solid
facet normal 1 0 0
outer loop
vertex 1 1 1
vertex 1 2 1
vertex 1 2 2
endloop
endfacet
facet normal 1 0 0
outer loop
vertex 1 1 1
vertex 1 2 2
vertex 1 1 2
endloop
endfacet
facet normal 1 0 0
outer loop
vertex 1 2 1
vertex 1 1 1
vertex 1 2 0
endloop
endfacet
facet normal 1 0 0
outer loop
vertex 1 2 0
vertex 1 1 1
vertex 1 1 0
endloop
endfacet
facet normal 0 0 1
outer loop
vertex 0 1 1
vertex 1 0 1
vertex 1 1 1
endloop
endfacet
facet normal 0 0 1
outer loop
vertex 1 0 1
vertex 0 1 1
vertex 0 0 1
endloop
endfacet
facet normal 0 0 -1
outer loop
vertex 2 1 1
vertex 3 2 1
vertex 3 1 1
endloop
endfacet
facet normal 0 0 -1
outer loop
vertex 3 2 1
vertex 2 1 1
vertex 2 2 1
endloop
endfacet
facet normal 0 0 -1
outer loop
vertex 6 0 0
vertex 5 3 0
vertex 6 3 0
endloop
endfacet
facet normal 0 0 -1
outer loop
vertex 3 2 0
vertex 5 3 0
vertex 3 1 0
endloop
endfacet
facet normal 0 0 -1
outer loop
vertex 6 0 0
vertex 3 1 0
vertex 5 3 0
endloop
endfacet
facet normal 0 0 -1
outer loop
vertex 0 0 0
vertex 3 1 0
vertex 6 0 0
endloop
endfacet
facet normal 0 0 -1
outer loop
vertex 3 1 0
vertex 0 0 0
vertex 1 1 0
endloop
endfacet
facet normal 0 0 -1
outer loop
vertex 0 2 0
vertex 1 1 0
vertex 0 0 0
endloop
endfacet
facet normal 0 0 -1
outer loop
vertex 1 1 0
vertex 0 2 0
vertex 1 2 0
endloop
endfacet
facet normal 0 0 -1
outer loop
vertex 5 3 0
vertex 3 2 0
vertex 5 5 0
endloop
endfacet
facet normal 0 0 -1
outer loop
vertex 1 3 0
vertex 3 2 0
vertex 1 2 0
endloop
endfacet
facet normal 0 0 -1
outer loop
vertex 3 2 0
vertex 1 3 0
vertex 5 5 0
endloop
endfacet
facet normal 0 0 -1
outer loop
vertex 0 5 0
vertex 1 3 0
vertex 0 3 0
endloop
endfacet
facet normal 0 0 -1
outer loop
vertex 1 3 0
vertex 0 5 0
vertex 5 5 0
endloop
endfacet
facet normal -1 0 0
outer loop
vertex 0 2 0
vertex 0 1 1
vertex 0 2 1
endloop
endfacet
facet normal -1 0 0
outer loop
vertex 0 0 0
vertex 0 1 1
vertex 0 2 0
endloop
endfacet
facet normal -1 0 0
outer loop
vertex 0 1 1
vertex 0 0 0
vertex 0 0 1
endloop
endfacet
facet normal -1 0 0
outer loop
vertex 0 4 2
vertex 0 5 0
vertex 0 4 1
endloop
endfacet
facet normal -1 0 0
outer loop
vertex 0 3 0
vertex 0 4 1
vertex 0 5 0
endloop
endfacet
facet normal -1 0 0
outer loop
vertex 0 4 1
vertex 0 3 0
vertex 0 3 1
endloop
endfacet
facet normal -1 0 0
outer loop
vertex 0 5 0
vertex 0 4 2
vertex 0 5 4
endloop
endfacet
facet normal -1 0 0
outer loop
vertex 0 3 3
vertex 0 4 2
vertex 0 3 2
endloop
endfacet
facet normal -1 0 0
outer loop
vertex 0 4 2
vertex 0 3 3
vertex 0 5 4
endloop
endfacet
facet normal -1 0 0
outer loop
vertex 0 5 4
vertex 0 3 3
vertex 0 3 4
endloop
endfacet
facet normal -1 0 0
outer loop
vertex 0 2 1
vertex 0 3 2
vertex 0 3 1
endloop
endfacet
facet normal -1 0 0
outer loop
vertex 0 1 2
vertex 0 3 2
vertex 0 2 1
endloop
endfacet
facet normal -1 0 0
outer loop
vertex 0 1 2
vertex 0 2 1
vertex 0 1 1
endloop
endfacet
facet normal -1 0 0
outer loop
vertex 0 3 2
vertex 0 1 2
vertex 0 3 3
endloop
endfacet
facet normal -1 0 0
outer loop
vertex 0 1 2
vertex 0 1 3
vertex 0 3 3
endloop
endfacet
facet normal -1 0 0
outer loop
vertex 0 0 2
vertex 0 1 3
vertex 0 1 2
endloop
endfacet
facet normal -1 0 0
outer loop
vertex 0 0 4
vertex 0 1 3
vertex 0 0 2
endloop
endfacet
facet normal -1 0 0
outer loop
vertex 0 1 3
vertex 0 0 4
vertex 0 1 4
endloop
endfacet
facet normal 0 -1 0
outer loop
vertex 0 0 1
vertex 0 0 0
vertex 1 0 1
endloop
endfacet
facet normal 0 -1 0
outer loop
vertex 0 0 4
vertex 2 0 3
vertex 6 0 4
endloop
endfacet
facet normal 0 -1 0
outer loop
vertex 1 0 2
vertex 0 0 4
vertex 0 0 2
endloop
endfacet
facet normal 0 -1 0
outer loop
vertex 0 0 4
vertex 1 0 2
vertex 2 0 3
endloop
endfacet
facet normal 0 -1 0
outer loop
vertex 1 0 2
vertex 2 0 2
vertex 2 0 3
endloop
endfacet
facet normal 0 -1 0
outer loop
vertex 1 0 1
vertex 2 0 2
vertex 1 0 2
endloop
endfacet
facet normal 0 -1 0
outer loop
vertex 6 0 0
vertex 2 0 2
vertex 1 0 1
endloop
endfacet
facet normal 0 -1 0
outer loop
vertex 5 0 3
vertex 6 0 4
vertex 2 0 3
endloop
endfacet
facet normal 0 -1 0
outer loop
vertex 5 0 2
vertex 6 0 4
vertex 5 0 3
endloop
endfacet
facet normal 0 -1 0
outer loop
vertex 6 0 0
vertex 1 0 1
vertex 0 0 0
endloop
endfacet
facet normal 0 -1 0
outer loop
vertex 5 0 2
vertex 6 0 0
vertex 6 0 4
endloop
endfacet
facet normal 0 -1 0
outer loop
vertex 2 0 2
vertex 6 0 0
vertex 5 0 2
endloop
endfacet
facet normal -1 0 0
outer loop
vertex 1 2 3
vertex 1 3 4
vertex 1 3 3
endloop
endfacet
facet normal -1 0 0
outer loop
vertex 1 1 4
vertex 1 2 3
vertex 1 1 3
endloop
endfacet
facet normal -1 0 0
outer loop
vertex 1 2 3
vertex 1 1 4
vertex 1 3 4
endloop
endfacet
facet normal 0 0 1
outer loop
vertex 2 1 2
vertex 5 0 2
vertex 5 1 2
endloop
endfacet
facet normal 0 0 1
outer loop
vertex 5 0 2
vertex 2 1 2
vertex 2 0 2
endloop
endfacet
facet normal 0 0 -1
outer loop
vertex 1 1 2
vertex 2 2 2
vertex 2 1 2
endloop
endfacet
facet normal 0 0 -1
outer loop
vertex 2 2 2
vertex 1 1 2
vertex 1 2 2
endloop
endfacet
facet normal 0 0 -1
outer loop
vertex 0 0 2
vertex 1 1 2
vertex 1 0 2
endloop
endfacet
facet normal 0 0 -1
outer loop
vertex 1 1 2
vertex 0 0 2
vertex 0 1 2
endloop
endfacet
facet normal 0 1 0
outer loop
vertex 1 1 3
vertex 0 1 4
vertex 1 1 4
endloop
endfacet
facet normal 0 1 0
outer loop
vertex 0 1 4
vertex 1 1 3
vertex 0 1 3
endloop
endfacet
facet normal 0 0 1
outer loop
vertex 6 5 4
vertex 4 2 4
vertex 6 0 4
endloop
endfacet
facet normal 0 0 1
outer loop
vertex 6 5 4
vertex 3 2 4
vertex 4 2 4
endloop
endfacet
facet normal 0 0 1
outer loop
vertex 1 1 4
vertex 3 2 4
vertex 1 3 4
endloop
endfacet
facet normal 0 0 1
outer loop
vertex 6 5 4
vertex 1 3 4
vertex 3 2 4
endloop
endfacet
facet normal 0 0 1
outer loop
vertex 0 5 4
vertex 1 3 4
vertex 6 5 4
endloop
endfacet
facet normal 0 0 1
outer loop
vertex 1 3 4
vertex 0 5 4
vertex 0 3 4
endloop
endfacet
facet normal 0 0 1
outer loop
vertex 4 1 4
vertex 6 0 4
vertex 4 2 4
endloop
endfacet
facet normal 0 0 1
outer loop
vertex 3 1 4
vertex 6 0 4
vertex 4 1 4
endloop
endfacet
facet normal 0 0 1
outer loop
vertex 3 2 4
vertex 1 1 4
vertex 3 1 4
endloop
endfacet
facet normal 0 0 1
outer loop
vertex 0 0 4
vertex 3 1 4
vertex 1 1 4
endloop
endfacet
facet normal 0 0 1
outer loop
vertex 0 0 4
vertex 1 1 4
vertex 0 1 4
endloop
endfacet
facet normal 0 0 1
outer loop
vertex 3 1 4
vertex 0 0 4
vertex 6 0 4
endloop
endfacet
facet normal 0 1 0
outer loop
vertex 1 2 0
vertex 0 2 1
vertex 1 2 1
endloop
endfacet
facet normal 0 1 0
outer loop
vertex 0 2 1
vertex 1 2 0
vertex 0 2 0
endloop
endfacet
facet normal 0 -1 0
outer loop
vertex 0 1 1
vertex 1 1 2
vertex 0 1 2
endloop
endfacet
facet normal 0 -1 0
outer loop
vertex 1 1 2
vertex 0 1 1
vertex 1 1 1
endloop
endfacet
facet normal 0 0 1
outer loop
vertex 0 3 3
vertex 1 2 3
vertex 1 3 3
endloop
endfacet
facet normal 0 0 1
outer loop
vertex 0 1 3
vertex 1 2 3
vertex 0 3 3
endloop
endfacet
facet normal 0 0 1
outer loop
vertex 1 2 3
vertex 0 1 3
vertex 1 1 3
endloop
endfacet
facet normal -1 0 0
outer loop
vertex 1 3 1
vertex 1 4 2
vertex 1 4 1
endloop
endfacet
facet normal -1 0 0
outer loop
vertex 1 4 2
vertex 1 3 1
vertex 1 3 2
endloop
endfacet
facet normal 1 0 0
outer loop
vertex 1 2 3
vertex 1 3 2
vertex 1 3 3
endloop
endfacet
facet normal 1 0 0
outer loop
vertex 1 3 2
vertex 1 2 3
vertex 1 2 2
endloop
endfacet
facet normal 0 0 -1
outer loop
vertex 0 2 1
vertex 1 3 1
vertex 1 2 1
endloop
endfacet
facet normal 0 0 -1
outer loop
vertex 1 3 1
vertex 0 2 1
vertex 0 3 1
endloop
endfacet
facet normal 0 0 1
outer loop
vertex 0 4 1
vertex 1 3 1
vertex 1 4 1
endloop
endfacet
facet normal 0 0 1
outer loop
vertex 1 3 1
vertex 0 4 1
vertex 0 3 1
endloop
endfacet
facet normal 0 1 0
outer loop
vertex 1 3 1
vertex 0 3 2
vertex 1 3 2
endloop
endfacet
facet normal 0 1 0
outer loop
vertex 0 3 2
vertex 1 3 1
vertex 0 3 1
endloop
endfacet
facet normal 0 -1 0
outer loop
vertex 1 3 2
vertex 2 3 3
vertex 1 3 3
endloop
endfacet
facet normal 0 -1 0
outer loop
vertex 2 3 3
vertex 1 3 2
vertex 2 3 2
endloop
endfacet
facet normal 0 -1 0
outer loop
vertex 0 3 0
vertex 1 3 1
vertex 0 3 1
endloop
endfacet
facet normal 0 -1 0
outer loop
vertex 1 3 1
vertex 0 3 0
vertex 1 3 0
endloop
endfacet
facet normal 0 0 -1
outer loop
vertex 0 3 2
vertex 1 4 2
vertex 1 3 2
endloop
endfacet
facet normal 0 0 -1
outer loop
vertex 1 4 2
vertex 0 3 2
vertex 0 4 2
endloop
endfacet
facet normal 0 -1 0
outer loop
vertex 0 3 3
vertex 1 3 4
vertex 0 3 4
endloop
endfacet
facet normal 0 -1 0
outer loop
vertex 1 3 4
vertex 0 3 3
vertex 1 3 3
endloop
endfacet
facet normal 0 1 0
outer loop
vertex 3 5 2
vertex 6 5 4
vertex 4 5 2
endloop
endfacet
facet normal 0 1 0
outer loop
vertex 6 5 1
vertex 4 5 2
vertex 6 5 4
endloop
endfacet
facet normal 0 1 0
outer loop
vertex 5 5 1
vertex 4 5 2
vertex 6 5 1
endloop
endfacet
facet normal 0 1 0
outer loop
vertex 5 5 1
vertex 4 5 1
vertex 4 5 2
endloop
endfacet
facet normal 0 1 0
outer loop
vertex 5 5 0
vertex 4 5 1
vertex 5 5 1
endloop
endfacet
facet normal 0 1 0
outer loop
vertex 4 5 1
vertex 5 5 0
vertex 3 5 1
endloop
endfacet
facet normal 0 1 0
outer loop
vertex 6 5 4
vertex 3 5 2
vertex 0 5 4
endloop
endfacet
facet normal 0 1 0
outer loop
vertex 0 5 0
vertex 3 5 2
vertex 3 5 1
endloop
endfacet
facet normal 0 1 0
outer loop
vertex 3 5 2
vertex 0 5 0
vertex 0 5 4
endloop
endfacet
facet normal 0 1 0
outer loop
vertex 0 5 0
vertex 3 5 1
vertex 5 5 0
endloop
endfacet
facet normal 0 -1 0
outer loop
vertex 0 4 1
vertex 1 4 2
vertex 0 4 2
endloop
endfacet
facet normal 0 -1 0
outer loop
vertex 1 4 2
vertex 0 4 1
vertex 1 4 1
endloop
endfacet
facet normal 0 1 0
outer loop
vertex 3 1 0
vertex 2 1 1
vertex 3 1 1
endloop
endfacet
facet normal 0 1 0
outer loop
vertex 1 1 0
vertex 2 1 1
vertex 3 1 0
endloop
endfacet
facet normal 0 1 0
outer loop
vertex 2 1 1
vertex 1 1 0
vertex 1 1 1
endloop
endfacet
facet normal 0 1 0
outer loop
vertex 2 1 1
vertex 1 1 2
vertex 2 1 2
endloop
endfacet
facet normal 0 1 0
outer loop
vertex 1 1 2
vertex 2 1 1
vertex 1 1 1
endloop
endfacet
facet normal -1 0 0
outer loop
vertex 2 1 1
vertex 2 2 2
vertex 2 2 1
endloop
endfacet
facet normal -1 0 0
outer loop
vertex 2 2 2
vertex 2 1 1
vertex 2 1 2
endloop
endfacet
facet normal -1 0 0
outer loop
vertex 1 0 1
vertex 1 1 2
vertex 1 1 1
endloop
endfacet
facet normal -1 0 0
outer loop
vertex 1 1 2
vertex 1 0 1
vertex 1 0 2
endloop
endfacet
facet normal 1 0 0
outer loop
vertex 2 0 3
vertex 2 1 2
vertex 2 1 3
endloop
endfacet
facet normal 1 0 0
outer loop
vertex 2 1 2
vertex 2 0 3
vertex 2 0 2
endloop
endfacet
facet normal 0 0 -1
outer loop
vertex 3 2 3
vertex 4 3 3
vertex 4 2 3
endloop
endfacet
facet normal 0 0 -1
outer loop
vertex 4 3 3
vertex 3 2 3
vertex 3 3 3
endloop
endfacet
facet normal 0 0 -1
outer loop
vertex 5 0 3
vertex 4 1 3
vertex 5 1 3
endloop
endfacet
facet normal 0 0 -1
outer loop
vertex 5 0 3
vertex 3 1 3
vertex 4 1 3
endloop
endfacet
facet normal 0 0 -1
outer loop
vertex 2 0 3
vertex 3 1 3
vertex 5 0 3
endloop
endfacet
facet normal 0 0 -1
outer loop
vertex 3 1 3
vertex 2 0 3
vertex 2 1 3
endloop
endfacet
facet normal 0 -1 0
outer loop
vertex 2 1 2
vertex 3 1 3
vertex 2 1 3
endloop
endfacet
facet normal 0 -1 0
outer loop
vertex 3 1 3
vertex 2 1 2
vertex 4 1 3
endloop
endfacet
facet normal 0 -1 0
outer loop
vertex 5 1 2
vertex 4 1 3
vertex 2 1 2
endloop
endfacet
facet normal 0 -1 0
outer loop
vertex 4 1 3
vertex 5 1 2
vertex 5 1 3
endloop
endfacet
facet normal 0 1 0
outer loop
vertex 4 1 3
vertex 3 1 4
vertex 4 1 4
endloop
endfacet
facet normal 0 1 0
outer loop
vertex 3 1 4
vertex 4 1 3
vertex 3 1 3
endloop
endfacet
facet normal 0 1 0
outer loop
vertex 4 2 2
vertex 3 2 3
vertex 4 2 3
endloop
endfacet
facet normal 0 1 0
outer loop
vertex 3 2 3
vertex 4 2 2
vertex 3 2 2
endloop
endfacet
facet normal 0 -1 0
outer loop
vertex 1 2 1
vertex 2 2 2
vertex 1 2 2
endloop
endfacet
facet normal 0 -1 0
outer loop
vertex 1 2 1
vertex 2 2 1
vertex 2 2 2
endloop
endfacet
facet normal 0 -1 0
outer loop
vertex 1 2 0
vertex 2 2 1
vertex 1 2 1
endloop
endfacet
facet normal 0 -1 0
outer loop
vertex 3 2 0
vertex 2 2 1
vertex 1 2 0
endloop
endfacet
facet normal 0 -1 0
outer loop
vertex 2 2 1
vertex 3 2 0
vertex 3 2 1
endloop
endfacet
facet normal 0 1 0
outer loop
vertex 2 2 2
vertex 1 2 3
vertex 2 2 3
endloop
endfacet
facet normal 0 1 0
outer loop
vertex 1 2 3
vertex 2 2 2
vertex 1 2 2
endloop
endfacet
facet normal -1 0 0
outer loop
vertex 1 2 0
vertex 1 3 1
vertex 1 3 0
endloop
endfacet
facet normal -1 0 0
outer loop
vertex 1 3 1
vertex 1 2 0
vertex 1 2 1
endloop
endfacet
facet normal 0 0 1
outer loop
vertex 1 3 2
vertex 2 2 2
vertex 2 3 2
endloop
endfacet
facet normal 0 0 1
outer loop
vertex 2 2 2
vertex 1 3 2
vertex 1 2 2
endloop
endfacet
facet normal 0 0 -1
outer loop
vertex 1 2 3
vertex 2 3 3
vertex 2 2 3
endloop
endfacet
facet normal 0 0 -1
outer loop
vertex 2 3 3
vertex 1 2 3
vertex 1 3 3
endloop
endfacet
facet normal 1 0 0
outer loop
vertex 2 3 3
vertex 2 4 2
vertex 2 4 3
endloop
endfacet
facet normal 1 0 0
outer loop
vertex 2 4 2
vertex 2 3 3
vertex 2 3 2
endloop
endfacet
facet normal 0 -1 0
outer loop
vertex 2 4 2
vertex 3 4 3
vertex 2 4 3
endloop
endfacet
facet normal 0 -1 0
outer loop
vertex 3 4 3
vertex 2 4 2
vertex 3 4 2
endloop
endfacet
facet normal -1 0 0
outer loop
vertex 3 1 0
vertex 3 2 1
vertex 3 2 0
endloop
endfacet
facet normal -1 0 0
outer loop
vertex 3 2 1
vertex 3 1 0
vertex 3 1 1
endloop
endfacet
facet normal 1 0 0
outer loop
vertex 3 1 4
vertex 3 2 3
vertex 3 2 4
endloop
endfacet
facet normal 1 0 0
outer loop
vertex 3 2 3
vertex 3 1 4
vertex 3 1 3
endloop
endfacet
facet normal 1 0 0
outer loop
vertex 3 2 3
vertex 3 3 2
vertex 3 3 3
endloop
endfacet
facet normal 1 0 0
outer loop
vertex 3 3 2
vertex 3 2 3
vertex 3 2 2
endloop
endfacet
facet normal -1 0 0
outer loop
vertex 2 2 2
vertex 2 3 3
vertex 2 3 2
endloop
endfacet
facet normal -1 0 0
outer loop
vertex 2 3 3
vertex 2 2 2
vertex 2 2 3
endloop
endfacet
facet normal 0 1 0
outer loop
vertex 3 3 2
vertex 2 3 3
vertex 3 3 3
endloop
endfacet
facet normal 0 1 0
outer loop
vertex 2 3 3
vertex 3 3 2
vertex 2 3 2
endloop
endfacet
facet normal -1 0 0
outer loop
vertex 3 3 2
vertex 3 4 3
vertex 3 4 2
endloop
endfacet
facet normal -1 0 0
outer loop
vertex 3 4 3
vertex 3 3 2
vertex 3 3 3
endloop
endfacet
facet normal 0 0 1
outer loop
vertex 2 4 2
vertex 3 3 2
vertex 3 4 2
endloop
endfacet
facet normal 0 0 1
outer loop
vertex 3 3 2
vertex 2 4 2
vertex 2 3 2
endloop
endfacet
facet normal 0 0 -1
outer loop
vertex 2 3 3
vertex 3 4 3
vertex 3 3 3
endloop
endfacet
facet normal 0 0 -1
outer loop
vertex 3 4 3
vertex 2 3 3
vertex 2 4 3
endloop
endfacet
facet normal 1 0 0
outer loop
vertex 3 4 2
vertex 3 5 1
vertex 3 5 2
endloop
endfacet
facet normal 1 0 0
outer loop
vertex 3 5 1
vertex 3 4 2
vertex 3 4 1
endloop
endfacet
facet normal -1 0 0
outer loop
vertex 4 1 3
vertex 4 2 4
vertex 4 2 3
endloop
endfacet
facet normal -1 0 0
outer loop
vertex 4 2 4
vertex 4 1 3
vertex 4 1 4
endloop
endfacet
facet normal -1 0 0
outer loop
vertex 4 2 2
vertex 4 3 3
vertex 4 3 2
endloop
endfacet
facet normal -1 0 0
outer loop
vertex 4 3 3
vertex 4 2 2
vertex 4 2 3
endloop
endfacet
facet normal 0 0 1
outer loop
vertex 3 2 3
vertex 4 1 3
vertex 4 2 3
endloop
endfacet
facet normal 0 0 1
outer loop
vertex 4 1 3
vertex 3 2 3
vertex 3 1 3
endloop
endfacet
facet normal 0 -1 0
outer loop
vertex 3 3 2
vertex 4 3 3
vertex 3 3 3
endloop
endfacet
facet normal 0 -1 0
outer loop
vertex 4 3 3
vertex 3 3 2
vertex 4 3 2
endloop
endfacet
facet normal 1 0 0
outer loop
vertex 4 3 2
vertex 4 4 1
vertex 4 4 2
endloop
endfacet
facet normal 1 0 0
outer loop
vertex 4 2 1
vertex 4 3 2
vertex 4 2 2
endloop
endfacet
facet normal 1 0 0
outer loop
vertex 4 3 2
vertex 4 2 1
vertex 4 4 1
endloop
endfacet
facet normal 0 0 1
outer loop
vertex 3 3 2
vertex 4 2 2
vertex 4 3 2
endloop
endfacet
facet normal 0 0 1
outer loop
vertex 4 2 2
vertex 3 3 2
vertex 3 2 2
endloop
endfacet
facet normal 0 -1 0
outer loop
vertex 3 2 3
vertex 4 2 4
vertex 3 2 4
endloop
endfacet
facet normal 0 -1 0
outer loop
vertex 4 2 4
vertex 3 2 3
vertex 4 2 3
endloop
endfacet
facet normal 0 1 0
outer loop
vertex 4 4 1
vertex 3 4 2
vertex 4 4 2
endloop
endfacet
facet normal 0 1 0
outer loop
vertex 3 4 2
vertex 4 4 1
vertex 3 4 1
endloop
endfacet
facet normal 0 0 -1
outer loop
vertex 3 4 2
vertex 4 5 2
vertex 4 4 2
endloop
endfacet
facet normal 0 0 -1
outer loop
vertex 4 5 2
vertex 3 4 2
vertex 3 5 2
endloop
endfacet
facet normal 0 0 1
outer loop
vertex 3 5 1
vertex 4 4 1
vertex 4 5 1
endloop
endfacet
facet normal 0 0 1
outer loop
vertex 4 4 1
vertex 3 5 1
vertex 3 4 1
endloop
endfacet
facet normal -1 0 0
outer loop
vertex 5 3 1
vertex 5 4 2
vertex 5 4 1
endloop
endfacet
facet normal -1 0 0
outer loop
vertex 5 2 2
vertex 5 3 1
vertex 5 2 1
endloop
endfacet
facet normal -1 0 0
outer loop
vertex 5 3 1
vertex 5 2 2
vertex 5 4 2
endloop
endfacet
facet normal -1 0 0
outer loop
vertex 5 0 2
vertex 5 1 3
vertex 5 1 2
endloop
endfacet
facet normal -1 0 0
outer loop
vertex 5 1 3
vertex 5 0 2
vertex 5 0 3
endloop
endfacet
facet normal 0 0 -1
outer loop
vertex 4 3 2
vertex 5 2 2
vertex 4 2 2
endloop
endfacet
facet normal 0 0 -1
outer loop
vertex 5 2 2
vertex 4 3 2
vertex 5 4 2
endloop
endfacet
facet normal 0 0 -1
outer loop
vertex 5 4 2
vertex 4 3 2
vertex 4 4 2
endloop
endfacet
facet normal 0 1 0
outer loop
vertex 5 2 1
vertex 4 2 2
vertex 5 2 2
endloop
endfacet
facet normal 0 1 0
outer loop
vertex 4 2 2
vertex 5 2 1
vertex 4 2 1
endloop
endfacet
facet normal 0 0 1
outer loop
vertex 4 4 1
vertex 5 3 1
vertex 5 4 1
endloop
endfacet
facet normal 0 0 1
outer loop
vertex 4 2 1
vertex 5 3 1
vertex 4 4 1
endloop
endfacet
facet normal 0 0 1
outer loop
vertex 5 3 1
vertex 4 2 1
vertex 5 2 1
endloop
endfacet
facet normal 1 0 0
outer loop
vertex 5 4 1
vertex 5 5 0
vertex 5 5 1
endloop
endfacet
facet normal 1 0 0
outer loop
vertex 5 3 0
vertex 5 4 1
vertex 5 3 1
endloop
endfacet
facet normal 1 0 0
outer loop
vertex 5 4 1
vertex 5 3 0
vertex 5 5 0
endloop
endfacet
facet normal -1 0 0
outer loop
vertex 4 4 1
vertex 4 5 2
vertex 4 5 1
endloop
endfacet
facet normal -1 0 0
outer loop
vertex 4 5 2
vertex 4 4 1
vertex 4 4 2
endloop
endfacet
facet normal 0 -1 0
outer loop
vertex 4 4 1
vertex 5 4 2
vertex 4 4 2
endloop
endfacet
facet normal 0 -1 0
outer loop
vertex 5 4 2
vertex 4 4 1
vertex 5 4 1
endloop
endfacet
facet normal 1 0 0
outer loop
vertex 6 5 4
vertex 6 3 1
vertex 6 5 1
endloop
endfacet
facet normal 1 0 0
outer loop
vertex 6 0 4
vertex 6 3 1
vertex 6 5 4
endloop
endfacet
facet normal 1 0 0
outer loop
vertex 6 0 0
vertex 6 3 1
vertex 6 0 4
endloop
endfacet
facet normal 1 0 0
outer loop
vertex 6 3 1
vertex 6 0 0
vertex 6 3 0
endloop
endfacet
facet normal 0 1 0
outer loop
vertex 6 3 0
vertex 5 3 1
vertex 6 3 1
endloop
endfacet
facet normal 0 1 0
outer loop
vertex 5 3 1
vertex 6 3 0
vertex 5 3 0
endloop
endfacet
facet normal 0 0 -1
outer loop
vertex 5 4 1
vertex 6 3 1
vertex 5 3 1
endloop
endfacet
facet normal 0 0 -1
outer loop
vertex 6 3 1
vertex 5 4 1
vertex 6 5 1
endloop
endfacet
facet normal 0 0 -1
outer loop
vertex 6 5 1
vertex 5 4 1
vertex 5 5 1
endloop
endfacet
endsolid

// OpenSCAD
union() {
    translate([0, 0, 0]) cube([1, 1, 1]);
    translate([0, 0, 2]) cube([1, 1, 1]);
    translate([0, 0, 3]) cube([1, 1, 1]);
    translate([0, 1, 0]) cube([1, 1, 1]);
    translate([0, 1, 1]) cube([1, 1, 1]);
    translate([0, 1, 2]) cube([1, 1, 1]);
    translate([0, 2, 1]) cube([1, 1, 1]);
    translate([0, 2, 2]) cube([1, 1, 1]);
    translate([0, 3, 0]) cube([1, 1, 1]);
    translate([0, 3, 2]) cube([1, 1, 1]);
    translate([0, 3, 3]) cube([1, 1, 1]);
    translate([0, 4, 0]) cube([1, 1, 1]);
    translate([0, 4, 1]) cube([1, 1, 1]);
    translate([0, 4, 2]) cube([1, 1, 1]);
    translate([0, 4, 3]) cube([1, 1, 1]);
    translate([1, 0, 0]) cube([1, 1, 1]);
    translate([1, 0, 1]) cube([1, 1, 1]);
    translate([1, 0, 2]) cube([1, 1, 1]);
    translate([1, 0, 3]) cube([1, 1, 1]);
    translate([1, 1, 2]) cube([1, 1, 1]);
    translate([1, 1, 3]) cube([1, 1, 1]);
    translate([1, 2, 0]) cube([1, 1, 1]);
    translate([1, 2, 1]) cube([1, 1, 1]);
    translate([1, 2, 3]) cube([1, 1, 1]);
    translate([1, 3, 0]) cube([1, 1, 1]);
    translate([1, 3, 1]) cube([1, 1, 1]);
    translate([1, 3, 2]) cube([1, 1, 1]);
    translate([1, 3, 3]) cube([1, 1, 1]);
    translate([1, 4, 0]) cube([1, 1, 1]);
    translate([1, 4, 1]) cube([1, 1, 1]);
    translate([1, 4, 2]) cube([1, 1, 1]);
    translate([1, 4, 3]) cube([1, 1, 1]);
    translate([2, 0, 0]) cube([1, 1, 1]);
    translate([2, 0, 1]) cube([1, 1, 1]);
    translate([2, 0, 3]) cube([1, 1, 1]);
    translate([2, 1, 1]) cube([1, 1, 1]);
    translate([2, 1, 2]) cube([1, 1, 1]);
    translate([2, 1, 3]) cube([1, 1, 1]);
    translate([2, 2, 0]) cube([1, 1, 1]);
    translate([2, 2, 1]) cube([1, 1, 1]);
    translate([2, 2, 2]) cube([1, 1, 1]);
    translate([2, 2, 3]) cube([1, 1, 1]);
    translate([2, 3, 0]) cube([1, 1, 1]);
    translate([2, 3, 1]) cube([1, 1, 1]);
    translate([2, 3, 3]) cube([1, 1, 1]);
    translate([2, 4, 0]) cube([1, 1, 1]);
    translate([2, 4, 1]) cube([1, 1, 1]);
    translate([2, 4, 2]) cube([1, 1, 1]);
    translate([2, 4, 3]) cube([1, 1, 1]);
    translate([3, 0, 0]) cube([1, 1, 1]);
    translate([3, 0, 1]) cube([1, 1, 1]);
    translate([3, 0, 3]) cube([1, 1, 1]);
    translate([3, 1, 0]) cube([1, 1, 1]);
    translate([3, 1, 1]) cube([1, 1, 1]);
    translate([3, 1, 2]) cube([1, 1, 1]);
    translate([3, 2, 0]) cube([1, 1, 1]);
    translate([3, 2, 1]) cube([1, 1, 1]);
    translate([3, 2, 3]) cube([1, 1, 1]);
    translate([3, 3, 0]) cube([1, 1, 1]);
    translate([3, 3, 1]) cube([1, 1, 1]);
    translate([3, 3, 2]) cube([1, 1, 1]);
    translate([3, 3, 3]) cube([1, 1, 1]);
    translate([3, 4, 0]) cube([1, 1, 1]);
    translate([3, 4, 2]) cube([1, 1, 1]);
    translate([3, 4, 3]) cube([1, 1, 1]);
    translate([4, 0, 0]) cube([1, 1, 1]);
    translate([4, 0, 1]) cube([1, 1, 1]);
    translate([4, 0, 3]) cube([1, 1, 1]);
    translate([4, 1, 0]) cube([1, 1, 1]);
    translate([4, 1, 1]) cube([1, 1, 1]);
    translate([4, 1, 2]) cube([1, 1, 1]);
    translate([4, 1, 3]) cube([1, 1, 1]);
    translate([4, 2, 0]) cube([1, 1, 1]);
    translate([4, 2, 2]) cube([1, 1, 1]);
    translate([4, 2, 3]) cube([1, 1, 1]);
    translate([4, 3, 0]) cube([1, 1, 1]);
    translate([4, 3, 2]) cube([1, 1, 1]);
    translate([4, 3, 3]) cube([1, 1, 1]);
    translate([4, 4, 0]) cube([1, 1, 1]);
    translate([4, 4, 1]) cube([1, 1, 1]);
    translate([4, 4, 2]) cube([1, 1, 1]);
    translate([4, 4, 3]) cube([1, 1, 1]);
    translate([5, 0, 0]) cube([1, 1, 1]);
    translate([5, 0, 1]) cube([1, 1, 1]);
    translate([5, 0, 2]) cube([1, 1, 1]);
    translate([5, 0, 3]) cube([1, 1, 1]);
    translate([5, 1, 0]) cube([1, 1, 1]);
    translate([5, 1, 1]) cube([1, 1, 1]);
    translate([5, 1, 2]) cube([1, 1, 1]);
    translate([5, 1, 3]) cube([1, 1, 1]);
    translate([5, 2, 0]) cube([1, 1, 1]);
    translate([5, 2, 1]) cube([1, 1, 1]);
    translate([5, 2, 2]) cube([1, 1, 1]);
    translate([5, 2, 3]) cube([1, 1, 1]);
    translate([5, 3, 1]) cube([1, 1, 1]);
    translate([5, 3, 2]) cube([1, 1, 1]);
    translate([5, 3, 3]) cube([1, 1, 1]);
    translate([5, 4, 1]) cube([1, 1, 1]);
    translate([5, 4, 2]) cube([1, 1, 1]);
    translate([5, 4, 3]) cube([1, 1, 1]);
}
